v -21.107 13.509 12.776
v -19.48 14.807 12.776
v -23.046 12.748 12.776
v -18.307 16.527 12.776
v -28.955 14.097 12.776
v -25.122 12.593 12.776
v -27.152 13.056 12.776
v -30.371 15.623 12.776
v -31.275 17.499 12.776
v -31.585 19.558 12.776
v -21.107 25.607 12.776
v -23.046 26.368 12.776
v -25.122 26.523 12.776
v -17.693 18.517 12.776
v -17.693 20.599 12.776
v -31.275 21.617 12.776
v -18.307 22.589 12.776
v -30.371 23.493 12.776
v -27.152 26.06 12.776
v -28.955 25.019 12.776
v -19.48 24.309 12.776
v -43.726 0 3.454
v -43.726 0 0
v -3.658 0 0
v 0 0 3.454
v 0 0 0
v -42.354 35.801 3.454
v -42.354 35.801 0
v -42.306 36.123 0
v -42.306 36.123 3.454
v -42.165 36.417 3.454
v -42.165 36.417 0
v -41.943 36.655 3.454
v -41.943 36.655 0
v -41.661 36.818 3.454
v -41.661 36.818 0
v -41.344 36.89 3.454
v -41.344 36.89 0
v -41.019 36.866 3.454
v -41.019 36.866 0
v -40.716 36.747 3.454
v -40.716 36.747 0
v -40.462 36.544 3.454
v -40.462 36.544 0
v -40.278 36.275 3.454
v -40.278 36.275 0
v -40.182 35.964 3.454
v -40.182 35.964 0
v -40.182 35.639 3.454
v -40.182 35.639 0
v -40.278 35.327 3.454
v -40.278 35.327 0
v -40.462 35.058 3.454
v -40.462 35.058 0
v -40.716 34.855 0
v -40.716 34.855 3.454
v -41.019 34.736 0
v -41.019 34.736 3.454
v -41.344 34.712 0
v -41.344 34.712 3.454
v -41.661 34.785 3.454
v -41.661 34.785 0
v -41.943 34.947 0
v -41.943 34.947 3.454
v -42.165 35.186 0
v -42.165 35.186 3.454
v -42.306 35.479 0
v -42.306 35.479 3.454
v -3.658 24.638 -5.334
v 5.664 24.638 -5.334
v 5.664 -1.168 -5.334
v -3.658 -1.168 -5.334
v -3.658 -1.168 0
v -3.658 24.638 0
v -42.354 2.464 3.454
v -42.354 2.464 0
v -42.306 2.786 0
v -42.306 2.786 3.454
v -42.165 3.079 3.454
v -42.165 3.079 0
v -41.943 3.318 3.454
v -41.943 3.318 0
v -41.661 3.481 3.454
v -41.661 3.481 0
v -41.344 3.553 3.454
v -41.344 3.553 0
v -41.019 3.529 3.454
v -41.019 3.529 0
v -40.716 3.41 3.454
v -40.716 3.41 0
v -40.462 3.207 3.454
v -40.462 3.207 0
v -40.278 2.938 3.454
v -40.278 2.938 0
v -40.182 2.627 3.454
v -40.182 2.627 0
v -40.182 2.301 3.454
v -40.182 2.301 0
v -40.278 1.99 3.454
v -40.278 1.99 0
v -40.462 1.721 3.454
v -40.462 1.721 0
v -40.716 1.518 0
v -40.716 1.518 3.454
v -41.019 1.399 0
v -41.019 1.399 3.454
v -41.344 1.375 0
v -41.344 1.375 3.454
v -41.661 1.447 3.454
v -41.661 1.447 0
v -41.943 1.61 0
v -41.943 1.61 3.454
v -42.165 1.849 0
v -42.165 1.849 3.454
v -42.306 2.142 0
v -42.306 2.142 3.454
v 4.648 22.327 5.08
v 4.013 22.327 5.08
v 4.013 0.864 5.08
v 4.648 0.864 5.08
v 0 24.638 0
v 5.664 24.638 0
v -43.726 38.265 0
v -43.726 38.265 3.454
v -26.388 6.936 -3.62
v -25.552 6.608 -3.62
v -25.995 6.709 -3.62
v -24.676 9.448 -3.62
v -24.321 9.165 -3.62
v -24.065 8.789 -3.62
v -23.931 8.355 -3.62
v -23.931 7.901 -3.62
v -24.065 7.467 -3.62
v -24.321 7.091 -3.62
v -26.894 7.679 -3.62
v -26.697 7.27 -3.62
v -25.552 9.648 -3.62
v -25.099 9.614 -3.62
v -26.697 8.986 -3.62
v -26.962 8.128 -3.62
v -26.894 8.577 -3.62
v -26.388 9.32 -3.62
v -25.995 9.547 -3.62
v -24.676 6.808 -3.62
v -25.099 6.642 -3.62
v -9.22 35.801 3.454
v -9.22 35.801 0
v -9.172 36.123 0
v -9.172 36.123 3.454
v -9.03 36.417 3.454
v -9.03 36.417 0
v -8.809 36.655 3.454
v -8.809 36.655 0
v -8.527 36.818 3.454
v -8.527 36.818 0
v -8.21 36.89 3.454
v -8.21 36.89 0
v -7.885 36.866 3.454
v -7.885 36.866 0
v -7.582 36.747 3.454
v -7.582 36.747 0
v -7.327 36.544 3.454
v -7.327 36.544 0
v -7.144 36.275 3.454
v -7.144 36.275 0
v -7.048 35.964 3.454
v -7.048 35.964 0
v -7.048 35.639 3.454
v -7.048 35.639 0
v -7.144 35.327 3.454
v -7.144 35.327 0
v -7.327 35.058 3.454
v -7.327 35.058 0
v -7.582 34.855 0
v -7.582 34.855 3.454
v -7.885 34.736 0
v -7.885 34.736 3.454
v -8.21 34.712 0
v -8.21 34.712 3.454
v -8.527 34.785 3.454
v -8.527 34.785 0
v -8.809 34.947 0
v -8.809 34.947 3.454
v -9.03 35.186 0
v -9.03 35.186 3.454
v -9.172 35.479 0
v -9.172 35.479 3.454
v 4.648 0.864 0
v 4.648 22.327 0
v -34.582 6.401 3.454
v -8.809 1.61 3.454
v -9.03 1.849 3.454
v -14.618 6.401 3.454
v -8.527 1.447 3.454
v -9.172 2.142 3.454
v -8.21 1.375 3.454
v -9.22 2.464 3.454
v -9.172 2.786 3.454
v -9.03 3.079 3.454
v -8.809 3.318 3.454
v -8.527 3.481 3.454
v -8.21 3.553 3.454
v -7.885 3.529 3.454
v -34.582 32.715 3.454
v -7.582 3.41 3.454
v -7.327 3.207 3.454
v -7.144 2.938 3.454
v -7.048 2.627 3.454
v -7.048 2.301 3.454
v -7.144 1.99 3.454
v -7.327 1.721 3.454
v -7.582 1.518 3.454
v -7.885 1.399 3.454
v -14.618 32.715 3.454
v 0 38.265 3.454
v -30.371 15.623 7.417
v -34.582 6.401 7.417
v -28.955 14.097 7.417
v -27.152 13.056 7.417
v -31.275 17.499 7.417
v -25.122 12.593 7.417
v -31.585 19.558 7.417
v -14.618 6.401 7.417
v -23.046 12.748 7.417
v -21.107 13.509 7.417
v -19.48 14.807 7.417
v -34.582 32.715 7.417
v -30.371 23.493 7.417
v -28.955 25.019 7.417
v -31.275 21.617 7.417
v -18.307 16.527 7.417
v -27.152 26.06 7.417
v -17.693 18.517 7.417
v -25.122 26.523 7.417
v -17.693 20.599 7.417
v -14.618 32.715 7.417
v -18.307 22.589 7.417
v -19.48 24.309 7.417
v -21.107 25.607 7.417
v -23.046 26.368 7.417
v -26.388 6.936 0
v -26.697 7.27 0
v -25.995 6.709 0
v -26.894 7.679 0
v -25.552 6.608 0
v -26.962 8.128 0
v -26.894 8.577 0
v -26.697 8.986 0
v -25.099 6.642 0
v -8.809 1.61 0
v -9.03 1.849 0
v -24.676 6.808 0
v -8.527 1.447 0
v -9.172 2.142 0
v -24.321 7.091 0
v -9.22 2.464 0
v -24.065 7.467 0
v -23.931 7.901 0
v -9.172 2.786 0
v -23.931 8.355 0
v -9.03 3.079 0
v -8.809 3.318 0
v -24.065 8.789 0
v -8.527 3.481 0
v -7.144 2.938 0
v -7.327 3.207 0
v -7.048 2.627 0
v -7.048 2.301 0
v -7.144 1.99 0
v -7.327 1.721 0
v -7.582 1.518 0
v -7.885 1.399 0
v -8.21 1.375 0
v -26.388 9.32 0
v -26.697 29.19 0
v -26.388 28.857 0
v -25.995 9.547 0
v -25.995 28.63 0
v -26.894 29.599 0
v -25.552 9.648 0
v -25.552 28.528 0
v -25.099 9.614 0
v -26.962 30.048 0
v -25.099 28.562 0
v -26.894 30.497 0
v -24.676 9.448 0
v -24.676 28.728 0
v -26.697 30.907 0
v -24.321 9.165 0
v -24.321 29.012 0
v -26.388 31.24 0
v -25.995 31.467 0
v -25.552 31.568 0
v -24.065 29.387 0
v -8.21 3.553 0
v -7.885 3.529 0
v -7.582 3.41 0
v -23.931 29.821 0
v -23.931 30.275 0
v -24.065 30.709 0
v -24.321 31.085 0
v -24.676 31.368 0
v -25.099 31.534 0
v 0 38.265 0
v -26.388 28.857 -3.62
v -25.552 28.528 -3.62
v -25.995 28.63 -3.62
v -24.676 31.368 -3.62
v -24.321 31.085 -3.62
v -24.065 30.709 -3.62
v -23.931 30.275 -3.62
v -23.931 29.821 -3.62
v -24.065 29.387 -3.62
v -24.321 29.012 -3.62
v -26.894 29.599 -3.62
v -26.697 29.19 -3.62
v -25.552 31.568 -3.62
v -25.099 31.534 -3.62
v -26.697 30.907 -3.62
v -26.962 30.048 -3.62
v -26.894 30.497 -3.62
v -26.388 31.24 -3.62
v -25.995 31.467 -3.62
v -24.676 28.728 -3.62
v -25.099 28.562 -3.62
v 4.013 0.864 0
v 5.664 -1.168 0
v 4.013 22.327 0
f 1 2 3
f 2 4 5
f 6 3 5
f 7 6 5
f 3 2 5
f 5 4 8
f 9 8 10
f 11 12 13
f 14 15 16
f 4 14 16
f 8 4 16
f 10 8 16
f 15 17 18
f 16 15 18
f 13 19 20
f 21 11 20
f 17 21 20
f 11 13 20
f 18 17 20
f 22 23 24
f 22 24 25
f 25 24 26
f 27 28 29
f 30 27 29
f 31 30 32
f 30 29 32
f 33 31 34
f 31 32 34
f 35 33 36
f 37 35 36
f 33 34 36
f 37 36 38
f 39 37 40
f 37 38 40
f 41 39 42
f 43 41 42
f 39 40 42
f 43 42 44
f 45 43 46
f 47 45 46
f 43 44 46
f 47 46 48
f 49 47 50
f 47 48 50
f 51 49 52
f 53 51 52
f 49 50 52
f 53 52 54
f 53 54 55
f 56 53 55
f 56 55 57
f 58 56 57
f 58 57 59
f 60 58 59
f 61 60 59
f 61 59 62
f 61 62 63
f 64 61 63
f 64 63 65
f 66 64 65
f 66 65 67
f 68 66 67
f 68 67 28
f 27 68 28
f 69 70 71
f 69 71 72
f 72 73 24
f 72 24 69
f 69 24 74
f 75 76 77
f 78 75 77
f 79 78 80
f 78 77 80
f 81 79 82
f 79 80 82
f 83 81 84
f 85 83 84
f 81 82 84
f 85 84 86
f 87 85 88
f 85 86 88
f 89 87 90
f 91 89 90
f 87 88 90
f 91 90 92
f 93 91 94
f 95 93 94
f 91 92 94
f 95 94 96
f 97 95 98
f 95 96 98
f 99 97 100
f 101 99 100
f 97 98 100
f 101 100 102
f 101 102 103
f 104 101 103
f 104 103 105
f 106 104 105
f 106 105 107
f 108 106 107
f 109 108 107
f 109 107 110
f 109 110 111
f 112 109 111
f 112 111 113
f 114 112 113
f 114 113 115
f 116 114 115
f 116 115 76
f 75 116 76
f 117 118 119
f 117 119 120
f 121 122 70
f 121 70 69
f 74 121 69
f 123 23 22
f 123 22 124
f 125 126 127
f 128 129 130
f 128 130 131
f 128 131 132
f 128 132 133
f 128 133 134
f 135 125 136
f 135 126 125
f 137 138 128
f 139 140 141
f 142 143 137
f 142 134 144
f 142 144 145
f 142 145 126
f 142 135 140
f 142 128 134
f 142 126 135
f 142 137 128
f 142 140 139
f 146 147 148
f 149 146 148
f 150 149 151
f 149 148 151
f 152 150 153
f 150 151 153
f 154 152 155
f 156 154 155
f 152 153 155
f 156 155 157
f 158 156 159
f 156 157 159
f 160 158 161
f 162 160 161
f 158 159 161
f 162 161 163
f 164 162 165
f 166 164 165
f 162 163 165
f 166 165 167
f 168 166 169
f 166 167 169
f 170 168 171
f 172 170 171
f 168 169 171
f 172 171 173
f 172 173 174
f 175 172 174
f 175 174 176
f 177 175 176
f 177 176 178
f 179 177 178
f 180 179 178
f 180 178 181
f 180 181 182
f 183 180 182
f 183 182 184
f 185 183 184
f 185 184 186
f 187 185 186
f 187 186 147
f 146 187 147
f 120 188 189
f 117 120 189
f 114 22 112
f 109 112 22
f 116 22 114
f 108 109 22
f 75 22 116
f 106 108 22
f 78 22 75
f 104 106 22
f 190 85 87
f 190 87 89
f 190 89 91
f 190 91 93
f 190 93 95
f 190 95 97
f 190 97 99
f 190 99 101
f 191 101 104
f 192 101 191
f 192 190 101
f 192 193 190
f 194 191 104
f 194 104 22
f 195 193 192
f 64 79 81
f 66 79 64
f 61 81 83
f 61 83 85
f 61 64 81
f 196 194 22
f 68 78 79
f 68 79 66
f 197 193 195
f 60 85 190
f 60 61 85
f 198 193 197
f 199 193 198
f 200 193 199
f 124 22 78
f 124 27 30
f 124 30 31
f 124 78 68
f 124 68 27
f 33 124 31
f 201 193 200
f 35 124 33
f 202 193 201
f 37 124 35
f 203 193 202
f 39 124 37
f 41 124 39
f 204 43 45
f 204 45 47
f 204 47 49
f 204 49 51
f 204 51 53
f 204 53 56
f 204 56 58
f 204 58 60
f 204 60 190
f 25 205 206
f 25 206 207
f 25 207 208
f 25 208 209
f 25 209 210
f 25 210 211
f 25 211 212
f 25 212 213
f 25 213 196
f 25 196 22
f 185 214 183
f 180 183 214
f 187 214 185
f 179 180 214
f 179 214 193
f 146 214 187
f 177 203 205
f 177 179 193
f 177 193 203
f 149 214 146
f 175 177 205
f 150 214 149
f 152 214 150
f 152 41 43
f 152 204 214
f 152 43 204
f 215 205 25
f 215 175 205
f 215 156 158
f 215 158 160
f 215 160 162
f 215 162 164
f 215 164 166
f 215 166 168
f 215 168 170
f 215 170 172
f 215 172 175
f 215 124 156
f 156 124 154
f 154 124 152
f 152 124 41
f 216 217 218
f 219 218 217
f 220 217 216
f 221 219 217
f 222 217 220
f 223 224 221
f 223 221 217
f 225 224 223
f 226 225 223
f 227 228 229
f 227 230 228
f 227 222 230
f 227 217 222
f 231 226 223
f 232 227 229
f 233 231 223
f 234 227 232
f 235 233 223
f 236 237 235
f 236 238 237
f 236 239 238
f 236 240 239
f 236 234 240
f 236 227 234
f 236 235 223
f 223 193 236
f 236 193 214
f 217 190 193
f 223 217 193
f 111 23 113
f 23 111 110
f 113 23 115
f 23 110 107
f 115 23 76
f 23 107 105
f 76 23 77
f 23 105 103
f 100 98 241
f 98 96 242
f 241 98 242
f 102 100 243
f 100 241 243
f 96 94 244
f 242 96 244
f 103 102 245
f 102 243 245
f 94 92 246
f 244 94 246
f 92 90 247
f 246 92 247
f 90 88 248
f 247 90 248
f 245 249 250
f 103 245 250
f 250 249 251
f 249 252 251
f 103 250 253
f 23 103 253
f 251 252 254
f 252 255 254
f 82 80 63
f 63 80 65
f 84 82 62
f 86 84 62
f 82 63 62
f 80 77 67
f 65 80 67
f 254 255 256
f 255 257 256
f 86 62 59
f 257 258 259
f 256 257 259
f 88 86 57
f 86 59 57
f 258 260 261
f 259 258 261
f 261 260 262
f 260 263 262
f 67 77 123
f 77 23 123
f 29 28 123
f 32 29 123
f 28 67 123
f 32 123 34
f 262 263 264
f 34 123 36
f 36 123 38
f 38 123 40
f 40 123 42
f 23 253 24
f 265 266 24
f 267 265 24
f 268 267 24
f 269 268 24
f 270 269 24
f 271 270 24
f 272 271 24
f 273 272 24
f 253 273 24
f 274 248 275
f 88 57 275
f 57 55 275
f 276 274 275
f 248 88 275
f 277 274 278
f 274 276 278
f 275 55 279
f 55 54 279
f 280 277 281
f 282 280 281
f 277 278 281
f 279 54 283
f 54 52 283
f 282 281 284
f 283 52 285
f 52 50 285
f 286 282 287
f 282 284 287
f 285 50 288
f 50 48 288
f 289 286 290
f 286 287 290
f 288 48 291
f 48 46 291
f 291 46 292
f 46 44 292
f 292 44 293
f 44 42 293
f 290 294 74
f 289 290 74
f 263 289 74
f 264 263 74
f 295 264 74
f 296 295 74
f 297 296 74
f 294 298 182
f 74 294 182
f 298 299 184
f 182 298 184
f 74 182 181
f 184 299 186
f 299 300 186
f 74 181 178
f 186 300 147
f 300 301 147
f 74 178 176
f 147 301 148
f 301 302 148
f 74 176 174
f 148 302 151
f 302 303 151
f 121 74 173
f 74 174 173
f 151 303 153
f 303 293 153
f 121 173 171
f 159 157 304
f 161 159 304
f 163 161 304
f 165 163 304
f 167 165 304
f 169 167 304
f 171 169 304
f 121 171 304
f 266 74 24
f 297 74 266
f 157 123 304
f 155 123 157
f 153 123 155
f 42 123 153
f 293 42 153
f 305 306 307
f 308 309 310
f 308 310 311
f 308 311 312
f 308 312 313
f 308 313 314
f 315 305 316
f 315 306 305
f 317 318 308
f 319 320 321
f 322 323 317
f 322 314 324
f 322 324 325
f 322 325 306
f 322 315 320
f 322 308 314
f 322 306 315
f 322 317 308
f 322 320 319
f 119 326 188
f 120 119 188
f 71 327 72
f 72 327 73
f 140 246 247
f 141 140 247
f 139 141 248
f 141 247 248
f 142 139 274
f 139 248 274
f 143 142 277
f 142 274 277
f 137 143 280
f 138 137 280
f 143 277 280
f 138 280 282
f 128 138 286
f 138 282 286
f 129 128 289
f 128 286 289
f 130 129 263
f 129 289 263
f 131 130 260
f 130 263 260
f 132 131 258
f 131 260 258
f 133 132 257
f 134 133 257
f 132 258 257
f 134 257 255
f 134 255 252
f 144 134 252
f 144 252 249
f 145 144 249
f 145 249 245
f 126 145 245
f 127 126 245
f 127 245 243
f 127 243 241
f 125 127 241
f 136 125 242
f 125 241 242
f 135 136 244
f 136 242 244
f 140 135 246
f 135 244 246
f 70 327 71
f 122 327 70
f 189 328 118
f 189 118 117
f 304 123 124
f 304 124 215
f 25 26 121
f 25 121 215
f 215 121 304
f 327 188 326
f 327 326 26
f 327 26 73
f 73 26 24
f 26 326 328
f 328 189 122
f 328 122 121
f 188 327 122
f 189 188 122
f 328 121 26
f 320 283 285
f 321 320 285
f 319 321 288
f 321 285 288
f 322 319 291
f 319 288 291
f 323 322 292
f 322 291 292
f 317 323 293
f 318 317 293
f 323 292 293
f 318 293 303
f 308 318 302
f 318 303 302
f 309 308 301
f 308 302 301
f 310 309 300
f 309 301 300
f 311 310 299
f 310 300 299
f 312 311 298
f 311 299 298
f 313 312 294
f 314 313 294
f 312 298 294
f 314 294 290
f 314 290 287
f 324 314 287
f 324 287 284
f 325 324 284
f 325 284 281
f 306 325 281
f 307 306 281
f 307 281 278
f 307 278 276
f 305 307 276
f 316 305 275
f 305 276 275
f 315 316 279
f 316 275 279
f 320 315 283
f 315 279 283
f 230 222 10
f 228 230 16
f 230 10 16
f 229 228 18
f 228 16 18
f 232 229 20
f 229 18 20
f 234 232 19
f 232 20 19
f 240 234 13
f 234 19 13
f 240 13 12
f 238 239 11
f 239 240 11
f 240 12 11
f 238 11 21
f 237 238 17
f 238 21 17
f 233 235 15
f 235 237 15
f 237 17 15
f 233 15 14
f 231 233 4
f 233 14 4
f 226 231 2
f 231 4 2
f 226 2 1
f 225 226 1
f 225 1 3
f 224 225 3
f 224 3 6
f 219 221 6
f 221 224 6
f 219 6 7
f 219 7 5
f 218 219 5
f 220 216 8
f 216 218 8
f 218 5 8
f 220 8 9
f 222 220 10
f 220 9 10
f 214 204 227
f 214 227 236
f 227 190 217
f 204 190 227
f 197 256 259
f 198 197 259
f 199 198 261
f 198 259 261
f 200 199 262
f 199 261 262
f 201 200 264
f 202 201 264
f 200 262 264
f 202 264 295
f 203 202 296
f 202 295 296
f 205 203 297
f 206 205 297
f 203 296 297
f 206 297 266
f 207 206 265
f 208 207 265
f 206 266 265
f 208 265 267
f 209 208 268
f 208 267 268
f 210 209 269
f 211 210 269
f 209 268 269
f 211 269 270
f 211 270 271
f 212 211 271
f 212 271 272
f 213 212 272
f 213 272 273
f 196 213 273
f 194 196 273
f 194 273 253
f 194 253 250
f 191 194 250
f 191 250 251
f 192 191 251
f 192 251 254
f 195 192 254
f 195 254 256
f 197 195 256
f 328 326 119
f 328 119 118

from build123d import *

# Parameters (mm, degrees)
SKETCH1_W           = 43.7261
SKETCH1_H           = 38.2651
BOSS_EXTRUDE1_DEPTH = 3.4544
SKETCH2_W           = 9.3218
SKETCH2_H           = 25.8064
BOSS_EXTRUDE2_DEPTH = 5.334
SKETCH3_W           = 0.635
SKETCH3_H           = 21.463
BOSS_EXTRUDE3_DEPTH = 5.08
SKETCH4_R           = 1.0922
CUT_EXTRUDE1_DEPTH  = 5.08
SKETCH5_W           = 19.9644
SKETCH5_H           = 26.3144
BOSS_EXTRUDE4_DEPTH = 3.9624
SKETCH6_R           = 6.985
BOSS_EXTRUDE5_DEPTH = 6.5024
SKETCH7_R           = 1.524
BOSS_EXTRUDE6_DEPTH = 3.6195


with BuildPart() as part:
    # Sketch1 → Boss-Extrude1 (new body)
    with BuildSketch(Plane.XY):
        with Locations((-21.86305, 19.13255)):
            Rectangle(SKETCH1_W, SKETCH1_H)
    extrude(amount=BOSS_EXTRUDE1_DEPTH)

    # Sketch2 → Boss-Extrude2 (add)
    with BuildSketch(Plane(origin=(0, 0, 0), x_dir=(-1, 0, 0), z_dir=(0, 0, -1))):
        with Locations((-1.0033, 11.7348)):
            Rectangle(SKETCH2_W, SKETCH2_H)
    extrude(amount=BOSS_EXTRUDE2_DEPTH)

    # Sketch3 → Boss-Extrude3 (add)
    with BuildSketch(Plane.XY):
        with Locations((4.3307, 11.5951)):
            Rectangle(SKETCH3_W, SKETCH3_H)
    extrude(amount=BOSS_EXTRUDE3_DEPTH)

    # Sketch4 → Cut-Extrude1 (cut)
    with BuildSketch(Plane(origin=(0, 0, 0), x_dir=(-1, 0, 0), z_dir=(0, 0, -1))):
        with Locations((41.2623, 35.8013)):
            Circle(SKETCH4_R)
        with Locations((41.2623, 2.4638)):
            Circle(SKETCH4_R)
        with Locations((8.128, 2.4638)):
            Circle(SKETCH4_R)
        with Locations((8.128, 35.8013)):
            Circle(SKETCH4_R)
    extrude(amount=-CUT_EXTRUDE1_DEPTH, mode=Mode.SUBTRACT)

    # Sketch5 → Boss-Extrude4 (add)
    with BuildSketch(Plane.XY.offset(3.4544)):
        with Locations((-24.5999, 19.558)):
            Rectangle(SKETCH5_W, SKETCH5_H)
    extrude(amount=BOSS_EXTRUDE4_DEPTH)

    # Sketch6 → Boss-Extrude5 (add)
    with BuildSketch(Plane(origin=(0, 0, 12.7762), x_dir=(-1, 0, 0), z_dir=(0, 0, -1))):
        with Locations((24.5999, 19.558)):
            Circle(SKETCH6_R)
    extrude(amount=BOSS_EXTRUDE5_DEPTH)

    # Sketch7 → Boss-Extrude6 (add)
    with BuildSketch(Plane(origin=(0, 0, 0), x_dir=(-1, 0, 0), z_dir=(0, 0, -1))):
        with Locations((25.4381, 30.0482)):
            Circle(SKETCH7_R)
        with Locations((25.4381, 8.128)):
            Circle(SKETCH7_R)
    extrude(amount=BOSS_EXTRUDE6_DEPTH)


solid = part.part
